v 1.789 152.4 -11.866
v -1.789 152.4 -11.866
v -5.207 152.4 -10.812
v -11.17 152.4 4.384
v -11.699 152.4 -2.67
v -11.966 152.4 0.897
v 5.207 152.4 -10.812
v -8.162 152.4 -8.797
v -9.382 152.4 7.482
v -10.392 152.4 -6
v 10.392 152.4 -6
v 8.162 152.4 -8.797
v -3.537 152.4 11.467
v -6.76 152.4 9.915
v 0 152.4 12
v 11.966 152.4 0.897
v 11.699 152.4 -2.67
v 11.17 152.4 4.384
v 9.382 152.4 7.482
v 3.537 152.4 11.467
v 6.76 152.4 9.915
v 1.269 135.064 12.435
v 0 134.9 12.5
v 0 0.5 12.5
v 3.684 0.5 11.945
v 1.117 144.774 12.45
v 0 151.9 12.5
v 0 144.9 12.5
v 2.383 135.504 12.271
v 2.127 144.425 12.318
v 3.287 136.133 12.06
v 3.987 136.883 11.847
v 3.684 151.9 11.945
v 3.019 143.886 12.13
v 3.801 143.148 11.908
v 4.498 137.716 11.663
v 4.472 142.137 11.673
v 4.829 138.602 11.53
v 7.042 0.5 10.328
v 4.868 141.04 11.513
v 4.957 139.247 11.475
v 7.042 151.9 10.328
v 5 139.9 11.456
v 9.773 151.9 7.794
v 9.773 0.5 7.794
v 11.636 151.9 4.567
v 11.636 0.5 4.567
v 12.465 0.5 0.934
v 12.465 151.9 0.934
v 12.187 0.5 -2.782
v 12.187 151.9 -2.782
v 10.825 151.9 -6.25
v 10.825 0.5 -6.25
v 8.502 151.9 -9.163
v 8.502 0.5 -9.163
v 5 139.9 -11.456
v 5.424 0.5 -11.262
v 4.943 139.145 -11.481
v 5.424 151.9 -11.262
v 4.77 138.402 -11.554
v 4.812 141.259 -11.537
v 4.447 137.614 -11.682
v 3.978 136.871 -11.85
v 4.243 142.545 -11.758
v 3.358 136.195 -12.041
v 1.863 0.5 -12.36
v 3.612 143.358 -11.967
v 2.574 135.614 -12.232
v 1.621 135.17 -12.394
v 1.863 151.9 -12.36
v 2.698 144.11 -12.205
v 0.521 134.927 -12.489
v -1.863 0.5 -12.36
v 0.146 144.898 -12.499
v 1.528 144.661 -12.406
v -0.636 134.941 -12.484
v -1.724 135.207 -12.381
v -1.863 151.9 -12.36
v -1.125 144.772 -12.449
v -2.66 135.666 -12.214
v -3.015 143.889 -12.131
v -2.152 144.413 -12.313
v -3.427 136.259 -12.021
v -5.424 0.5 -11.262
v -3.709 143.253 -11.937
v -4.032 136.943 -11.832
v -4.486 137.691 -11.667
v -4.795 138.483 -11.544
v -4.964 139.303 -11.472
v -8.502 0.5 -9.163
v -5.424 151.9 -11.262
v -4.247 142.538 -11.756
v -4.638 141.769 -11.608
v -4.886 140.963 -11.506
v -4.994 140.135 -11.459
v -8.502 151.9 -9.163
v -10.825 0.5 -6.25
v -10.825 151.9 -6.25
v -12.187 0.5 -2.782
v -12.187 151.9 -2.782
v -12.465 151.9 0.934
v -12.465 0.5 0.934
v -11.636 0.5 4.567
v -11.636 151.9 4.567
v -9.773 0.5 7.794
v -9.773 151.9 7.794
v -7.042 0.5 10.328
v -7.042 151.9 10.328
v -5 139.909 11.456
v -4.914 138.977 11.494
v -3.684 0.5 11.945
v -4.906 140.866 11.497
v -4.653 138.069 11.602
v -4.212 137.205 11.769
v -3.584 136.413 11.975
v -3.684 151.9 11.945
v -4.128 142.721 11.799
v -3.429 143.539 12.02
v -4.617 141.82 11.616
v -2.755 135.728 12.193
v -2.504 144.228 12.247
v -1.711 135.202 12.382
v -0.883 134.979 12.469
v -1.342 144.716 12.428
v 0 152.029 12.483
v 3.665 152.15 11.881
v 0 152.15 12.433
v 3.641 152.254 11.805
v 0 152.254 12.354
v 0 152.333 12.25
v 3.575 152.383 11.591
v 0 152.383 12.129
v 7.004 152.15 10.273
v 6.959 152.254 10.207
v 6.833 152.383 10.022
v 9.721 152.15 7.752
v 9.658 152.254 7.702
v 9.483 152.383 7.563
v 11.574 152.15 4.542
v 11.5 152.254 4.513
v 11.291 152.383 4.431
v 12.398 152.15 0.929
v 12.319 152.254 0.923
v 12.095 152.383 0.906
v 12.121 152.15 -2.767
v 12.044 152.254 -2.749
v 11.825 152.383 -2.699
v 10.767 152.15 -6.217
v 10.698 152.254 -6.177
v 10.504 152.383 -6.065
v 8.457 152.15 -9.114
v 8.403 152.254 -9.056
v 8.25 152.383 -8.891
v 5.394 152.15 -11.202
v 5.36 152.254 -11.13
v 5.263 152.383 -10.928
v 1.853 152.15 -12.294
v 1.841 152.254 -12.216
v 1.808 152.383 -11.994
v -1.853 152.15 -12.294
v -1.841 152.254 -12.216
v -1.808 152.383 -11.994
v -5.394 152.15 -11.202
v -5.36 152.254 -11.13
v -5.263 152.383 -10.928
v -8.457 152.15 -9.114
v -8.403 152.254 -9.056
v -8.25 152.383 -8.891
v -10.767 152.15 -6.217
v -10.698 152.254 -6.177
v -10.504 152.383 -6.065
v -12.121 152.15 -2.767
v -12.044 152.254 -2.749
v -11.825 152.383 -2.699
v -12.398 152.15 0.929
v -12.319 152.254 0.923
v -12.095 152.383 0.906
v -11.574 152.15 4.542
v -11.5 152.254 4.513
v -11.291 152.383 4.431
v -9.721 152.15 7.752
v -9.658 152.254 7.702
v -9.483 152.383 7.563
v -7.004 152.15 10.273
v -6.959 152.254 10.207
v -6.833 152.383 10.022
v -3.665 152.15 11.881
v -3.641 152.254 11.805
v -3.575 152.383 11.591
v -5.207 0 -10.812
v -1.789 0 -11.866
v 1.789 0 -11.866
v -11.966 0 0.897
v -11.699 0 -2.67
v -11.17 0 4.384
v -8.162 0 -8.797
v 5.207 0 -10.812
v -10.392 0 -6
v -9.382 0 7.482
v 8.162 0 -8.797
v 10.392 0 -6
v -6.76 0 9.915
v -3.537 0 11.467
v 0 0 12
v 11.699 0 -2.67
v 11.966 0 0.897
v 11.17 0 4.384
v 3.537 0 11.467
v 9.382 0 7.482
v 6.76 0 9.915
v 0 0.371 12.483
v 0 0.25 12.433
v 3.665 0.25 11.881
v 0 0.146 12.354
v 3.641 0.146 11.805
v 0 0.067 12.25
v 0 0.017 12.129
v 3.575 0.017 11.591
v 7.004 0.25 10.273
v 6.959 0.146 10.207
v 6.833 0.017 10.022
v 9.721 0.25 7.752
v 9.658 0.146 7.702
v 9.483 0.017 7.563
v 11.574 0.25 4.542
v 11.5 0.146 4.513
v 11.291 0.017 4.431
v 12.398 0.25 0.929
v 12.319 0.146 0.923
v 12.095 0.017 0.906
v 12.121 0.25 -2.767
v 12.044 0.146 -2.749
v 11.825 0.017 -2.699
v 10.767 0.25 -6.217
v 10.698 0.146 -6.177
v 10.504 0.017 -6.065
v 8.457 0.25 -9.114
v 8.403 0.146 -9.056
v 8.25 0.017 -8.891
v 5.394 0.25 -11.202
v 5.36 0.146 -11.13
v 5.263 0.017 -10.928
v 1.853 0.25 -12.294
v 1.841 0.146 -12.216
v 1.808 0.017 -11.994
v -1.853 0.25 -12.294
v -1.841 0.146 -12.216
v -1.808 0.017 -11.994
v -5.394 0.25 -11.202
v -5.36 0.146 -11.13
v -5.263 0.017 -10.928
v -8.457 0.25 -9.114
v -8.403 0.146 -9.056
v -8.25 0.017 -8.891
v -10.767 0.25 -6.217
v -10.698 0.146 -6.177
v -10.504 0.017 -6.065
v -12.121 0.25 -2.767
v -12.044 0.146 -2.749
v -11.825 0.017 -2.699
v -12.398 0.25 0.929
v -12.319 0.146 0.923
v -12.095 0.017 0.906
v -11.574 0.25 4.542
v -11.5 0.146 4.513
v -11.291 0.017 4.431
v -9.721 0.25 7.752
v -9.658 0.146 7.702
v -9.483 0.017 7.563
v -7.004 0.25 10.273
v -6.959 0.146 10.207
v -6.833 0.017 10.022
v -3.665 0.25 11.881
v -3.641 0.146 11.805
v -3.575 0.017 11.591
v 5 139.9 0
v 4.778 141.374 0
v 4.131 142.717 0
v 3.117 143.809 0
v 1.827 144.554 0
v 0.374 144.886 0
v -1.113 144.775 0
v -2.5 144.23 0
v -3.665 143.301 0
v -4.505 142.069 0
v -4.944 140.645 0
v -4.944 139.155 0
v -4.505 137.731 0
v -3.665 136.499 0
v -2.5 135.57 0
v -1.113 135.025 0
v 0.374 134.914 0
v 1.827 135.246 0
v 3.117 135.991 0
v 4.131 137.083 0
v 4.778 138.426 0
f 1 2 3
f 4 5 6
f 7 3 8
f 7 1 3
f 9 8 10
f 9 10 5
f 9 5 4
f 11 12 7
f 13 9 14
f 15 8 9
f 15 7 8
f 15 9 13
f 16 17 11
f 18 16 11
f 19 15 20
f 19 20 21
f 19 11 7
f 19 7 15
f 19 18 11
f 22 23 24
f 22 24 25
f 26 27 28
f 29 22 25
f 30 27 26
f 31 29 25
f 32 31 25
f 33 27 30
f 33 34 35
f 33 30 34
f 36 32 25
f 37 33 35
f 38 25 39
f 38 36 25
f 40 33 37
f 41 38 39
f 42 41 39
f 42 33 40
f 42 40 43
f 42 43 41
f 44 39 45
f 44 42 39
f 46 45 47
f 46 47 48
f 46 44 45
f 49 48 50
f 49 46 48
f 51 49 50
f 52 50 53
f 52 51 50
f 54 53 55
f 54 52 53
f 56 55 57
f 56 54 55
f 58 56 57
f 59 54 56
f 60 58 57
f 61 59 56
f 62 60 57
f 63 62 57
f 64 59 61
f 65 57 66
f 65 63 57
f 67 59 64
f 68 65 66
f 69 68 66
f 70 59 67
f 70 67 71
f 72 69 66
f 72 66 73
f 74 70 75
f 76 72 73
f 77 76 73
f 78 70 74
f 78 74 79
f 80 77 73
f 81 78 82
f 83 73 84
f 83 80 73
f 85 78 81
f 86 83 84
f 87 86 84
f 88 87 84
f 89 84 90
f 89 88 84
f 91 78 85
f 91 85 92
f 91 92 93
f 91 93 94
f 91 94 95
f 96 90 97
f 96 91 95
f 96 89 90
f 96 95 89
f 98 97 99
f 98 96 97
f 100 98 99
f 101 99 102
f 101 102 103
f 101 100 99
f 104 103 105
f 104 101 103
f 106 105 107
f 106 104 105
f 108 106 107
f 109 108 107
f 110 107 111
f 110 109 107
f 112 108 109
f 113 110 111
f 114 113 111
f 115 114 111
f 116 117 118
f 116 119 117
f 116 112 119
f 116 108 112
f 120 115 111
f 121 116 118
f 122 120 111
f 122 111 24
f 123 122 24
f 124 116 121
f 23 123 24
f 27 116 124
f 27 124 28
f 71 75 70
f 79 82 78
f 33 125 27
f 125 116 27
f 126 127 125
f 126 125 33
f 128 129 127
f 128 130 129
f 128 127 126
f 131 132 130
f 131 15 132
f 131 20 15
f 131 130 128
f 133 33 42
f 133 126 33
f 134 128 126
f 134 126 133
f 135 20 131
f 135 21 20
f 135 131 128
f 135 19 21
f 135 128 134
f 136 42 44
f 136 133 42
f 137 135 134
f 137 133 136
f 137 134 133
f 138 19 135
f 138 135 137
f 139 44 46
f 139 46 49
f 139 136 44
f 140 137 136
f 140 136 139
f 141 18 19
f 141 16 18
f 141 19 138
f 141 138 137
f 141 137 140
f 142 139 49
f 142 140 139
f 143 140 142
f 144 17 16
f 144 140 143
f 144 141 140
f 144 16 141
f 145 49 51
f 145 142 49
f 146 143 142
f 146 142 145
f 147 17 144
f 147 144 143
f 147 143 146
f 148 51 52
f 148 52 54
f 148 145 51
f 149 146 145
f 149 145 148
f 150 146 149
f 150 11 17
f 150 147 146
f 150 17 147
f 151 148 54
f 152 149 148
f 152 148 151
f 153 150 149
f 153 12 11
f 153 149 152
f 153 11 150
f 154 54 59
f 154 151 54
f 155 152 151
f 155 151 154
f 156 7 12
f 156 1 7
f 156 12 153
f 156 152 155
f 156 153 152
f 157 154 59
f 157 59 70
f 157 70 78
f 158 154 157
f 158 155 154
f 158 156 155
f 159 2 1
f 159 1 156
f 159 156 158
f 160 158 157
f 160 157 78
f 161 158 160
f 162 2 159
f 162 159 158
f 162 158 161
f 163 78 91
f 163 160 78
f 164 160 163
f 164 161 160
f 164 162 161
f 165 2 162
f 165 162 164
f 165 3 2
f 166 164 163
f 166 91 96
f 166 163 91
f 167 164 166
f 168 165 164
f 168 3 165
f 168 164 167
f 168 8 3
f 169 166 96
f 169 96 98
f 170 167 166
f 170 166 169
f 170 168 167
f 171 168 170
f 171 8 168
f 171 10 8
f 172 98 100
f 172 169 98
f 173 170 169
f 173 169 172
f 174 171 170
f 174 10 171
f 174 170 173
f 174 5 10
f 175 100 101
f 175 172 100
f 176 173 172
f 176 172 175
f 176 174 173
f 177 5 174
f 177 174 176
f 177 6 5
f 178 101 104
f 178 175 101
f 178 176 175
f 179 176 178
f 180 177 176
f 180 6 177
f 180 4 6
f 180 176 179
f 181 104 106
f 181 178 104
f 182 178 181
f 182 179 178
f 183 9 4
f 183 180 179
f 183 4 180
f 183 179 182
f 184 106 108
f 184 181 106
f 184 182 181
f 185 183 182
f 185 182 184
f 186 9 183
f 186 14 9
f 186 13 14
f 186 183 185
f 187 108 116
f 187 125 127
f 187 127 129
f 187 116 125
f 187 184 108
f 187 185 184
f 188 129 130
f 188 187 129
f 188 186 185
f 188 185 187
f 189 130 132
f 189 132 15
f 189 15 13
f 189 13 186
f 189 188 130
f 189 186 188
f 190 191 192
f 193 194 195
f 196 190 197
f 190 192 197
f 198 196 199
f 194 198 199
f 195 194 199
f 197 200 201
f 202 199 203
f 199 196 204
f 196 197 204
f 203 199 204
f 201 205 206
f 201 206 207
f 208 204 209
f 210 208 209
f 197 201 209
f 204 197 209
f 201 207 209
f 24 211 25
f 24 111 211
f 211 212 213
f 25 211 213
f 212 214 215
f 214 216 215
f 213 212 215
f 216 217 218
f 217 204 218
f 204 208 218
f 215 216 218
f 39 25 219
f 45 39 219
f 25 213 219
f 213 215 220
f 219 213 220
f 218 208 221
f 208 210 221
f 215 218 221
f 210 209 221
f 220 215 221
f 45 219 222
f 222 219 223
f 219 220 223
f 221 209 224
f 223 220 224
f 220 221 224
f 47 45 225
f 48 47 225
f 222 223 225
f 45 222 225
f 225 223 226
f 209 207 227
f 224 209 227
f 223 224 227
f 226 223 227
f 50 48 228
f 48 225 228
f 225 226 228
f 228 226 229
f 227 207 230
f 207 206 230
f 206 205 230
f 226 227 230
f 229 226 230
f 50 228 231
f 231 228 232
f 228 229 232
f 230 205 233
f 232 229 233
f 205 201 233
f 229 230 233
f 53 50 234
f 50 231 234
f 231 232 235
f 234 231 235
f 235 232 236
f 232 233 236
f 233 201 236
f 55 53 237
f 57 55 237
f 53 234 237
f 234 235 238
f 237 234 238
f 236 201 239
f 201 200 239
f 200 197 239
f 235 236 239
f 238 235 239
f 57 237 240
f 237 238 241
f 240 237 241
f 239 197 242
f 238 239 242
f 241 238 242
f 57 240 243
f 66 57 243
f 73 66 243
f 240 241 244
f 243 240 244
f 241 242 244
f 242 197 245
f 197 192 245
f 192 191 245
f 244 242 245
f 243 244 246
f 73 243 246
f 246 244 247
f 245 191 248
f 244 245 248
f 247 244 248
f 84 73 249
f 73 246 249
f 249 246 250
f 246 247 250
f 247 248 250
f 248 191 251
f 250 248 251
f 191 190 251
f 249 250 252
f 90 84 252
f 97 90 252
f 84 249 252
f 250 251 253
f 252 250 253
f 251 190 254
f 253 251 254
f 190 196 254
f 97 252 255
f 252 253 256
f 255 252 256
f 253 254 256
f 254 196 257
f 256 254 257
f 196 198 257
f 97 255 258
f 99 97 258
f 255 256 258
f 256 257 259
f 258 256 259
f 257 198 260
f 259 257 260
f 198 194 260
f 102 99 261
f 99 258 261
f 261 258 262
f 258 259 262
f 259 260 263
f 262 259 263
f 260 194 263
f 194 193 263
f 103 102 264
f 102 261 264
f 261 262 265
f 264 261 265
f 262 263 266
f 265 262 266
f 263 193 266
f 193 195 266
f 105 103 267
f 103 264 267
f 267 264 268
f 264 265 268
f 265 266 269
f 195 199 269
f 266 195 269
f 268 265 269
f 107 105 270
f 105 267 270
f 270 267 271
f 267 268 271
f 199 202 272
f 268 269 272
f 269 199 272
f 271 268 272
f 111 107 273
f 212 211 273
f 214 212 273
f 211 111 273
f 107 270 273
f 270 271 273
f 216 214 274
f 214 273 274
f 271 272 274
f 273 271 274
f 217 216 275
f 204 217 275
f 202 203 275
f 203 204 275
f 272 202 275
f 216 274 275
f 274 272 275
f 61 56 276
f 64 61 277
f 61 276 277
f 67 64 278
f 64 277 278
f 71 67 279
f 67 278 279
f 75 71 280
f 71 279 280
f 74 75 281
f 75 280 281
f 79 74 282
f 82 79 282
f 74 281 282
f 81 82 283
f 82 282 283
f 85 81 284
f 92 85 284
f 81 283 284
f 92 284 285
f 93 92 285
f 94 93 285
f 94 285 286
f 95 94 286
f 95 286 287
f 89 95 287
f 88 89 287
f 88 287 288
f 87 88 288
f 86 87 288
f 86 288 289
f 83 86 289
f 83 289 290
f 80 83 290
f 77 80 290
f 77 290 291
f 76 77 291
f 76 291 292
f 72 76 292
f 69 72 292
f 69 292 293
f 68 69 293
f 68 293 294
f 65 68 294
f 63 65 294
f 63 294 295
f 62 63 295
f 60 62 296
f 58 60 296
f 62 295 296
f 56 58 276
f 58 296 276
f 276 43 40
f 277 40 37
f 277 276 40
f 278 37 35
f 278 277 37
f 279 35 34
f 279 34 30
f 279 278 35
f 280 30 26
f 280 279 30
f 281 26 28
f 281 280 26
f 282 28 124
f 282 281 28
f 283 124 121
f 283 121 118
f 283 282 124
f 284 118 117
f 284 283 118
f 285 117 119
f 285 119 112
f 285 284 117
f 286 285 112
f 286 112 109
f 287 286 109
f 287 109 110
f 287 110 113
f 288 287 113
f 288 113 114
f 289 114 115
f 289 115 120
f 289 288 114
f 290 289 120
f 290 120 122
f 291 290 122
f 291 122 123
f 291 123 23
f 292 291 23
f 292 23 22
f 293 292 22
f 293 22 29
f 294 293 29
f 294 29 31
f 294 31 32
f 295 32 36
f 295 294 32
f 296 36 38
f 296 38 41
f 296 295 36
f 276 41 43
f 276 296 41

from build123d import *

# Parameters (mm, degrees)
SWEEP1_PROFILE_R        = 12.5
SKETCH6_R               = 5
CUT_EXTRUDE1_DEPTH      = 13.5
CUT_EXTRUDE1_DEPTH_BACK = 13.5
FILLET1_R               = 0.5


with BuildPart() as part:
    # Sweep1: sweep along a path in Sketch1
    with BuildLine(Plane.XY) as sweep1_path:
        Line((0, 0), (0, 152.4))
    # Sweep1 profile (on start of the path) → Sweep1 (sweep)
    with BuildSketch(Plane.ZX):
        Circle(SWEEP1_PROFILE_R)
    sweep(path=sweep1_path.line)

    # Sketch6 → Cut-Extrude1 (cut, two sides)
    with BuildSketch(Plane.XY) as cut_extrude1_sk:
        with Locations((0, 139.9)):
            Circle(SKETCH6_R)
    extrude(amount=CUT_EXTRUDE1_DEPTH, mode=Mode.SUBTRACT)
    extrude(cut_extrude1_sk.sketch, amount=-CUT_EXTRUDE1_DEPTH_BACK, mode=Mode.SUBTRACT)

    # Fillet1
    fillet1_edges = [part.edges().sort_by_distance(p)[0] for p in [
        (0, 0, -12.5),
        (0, 152.4, -12.5),
    ]]
    fillet(fillet1_edges, radius=FILLET1_R)


solid = part.part
